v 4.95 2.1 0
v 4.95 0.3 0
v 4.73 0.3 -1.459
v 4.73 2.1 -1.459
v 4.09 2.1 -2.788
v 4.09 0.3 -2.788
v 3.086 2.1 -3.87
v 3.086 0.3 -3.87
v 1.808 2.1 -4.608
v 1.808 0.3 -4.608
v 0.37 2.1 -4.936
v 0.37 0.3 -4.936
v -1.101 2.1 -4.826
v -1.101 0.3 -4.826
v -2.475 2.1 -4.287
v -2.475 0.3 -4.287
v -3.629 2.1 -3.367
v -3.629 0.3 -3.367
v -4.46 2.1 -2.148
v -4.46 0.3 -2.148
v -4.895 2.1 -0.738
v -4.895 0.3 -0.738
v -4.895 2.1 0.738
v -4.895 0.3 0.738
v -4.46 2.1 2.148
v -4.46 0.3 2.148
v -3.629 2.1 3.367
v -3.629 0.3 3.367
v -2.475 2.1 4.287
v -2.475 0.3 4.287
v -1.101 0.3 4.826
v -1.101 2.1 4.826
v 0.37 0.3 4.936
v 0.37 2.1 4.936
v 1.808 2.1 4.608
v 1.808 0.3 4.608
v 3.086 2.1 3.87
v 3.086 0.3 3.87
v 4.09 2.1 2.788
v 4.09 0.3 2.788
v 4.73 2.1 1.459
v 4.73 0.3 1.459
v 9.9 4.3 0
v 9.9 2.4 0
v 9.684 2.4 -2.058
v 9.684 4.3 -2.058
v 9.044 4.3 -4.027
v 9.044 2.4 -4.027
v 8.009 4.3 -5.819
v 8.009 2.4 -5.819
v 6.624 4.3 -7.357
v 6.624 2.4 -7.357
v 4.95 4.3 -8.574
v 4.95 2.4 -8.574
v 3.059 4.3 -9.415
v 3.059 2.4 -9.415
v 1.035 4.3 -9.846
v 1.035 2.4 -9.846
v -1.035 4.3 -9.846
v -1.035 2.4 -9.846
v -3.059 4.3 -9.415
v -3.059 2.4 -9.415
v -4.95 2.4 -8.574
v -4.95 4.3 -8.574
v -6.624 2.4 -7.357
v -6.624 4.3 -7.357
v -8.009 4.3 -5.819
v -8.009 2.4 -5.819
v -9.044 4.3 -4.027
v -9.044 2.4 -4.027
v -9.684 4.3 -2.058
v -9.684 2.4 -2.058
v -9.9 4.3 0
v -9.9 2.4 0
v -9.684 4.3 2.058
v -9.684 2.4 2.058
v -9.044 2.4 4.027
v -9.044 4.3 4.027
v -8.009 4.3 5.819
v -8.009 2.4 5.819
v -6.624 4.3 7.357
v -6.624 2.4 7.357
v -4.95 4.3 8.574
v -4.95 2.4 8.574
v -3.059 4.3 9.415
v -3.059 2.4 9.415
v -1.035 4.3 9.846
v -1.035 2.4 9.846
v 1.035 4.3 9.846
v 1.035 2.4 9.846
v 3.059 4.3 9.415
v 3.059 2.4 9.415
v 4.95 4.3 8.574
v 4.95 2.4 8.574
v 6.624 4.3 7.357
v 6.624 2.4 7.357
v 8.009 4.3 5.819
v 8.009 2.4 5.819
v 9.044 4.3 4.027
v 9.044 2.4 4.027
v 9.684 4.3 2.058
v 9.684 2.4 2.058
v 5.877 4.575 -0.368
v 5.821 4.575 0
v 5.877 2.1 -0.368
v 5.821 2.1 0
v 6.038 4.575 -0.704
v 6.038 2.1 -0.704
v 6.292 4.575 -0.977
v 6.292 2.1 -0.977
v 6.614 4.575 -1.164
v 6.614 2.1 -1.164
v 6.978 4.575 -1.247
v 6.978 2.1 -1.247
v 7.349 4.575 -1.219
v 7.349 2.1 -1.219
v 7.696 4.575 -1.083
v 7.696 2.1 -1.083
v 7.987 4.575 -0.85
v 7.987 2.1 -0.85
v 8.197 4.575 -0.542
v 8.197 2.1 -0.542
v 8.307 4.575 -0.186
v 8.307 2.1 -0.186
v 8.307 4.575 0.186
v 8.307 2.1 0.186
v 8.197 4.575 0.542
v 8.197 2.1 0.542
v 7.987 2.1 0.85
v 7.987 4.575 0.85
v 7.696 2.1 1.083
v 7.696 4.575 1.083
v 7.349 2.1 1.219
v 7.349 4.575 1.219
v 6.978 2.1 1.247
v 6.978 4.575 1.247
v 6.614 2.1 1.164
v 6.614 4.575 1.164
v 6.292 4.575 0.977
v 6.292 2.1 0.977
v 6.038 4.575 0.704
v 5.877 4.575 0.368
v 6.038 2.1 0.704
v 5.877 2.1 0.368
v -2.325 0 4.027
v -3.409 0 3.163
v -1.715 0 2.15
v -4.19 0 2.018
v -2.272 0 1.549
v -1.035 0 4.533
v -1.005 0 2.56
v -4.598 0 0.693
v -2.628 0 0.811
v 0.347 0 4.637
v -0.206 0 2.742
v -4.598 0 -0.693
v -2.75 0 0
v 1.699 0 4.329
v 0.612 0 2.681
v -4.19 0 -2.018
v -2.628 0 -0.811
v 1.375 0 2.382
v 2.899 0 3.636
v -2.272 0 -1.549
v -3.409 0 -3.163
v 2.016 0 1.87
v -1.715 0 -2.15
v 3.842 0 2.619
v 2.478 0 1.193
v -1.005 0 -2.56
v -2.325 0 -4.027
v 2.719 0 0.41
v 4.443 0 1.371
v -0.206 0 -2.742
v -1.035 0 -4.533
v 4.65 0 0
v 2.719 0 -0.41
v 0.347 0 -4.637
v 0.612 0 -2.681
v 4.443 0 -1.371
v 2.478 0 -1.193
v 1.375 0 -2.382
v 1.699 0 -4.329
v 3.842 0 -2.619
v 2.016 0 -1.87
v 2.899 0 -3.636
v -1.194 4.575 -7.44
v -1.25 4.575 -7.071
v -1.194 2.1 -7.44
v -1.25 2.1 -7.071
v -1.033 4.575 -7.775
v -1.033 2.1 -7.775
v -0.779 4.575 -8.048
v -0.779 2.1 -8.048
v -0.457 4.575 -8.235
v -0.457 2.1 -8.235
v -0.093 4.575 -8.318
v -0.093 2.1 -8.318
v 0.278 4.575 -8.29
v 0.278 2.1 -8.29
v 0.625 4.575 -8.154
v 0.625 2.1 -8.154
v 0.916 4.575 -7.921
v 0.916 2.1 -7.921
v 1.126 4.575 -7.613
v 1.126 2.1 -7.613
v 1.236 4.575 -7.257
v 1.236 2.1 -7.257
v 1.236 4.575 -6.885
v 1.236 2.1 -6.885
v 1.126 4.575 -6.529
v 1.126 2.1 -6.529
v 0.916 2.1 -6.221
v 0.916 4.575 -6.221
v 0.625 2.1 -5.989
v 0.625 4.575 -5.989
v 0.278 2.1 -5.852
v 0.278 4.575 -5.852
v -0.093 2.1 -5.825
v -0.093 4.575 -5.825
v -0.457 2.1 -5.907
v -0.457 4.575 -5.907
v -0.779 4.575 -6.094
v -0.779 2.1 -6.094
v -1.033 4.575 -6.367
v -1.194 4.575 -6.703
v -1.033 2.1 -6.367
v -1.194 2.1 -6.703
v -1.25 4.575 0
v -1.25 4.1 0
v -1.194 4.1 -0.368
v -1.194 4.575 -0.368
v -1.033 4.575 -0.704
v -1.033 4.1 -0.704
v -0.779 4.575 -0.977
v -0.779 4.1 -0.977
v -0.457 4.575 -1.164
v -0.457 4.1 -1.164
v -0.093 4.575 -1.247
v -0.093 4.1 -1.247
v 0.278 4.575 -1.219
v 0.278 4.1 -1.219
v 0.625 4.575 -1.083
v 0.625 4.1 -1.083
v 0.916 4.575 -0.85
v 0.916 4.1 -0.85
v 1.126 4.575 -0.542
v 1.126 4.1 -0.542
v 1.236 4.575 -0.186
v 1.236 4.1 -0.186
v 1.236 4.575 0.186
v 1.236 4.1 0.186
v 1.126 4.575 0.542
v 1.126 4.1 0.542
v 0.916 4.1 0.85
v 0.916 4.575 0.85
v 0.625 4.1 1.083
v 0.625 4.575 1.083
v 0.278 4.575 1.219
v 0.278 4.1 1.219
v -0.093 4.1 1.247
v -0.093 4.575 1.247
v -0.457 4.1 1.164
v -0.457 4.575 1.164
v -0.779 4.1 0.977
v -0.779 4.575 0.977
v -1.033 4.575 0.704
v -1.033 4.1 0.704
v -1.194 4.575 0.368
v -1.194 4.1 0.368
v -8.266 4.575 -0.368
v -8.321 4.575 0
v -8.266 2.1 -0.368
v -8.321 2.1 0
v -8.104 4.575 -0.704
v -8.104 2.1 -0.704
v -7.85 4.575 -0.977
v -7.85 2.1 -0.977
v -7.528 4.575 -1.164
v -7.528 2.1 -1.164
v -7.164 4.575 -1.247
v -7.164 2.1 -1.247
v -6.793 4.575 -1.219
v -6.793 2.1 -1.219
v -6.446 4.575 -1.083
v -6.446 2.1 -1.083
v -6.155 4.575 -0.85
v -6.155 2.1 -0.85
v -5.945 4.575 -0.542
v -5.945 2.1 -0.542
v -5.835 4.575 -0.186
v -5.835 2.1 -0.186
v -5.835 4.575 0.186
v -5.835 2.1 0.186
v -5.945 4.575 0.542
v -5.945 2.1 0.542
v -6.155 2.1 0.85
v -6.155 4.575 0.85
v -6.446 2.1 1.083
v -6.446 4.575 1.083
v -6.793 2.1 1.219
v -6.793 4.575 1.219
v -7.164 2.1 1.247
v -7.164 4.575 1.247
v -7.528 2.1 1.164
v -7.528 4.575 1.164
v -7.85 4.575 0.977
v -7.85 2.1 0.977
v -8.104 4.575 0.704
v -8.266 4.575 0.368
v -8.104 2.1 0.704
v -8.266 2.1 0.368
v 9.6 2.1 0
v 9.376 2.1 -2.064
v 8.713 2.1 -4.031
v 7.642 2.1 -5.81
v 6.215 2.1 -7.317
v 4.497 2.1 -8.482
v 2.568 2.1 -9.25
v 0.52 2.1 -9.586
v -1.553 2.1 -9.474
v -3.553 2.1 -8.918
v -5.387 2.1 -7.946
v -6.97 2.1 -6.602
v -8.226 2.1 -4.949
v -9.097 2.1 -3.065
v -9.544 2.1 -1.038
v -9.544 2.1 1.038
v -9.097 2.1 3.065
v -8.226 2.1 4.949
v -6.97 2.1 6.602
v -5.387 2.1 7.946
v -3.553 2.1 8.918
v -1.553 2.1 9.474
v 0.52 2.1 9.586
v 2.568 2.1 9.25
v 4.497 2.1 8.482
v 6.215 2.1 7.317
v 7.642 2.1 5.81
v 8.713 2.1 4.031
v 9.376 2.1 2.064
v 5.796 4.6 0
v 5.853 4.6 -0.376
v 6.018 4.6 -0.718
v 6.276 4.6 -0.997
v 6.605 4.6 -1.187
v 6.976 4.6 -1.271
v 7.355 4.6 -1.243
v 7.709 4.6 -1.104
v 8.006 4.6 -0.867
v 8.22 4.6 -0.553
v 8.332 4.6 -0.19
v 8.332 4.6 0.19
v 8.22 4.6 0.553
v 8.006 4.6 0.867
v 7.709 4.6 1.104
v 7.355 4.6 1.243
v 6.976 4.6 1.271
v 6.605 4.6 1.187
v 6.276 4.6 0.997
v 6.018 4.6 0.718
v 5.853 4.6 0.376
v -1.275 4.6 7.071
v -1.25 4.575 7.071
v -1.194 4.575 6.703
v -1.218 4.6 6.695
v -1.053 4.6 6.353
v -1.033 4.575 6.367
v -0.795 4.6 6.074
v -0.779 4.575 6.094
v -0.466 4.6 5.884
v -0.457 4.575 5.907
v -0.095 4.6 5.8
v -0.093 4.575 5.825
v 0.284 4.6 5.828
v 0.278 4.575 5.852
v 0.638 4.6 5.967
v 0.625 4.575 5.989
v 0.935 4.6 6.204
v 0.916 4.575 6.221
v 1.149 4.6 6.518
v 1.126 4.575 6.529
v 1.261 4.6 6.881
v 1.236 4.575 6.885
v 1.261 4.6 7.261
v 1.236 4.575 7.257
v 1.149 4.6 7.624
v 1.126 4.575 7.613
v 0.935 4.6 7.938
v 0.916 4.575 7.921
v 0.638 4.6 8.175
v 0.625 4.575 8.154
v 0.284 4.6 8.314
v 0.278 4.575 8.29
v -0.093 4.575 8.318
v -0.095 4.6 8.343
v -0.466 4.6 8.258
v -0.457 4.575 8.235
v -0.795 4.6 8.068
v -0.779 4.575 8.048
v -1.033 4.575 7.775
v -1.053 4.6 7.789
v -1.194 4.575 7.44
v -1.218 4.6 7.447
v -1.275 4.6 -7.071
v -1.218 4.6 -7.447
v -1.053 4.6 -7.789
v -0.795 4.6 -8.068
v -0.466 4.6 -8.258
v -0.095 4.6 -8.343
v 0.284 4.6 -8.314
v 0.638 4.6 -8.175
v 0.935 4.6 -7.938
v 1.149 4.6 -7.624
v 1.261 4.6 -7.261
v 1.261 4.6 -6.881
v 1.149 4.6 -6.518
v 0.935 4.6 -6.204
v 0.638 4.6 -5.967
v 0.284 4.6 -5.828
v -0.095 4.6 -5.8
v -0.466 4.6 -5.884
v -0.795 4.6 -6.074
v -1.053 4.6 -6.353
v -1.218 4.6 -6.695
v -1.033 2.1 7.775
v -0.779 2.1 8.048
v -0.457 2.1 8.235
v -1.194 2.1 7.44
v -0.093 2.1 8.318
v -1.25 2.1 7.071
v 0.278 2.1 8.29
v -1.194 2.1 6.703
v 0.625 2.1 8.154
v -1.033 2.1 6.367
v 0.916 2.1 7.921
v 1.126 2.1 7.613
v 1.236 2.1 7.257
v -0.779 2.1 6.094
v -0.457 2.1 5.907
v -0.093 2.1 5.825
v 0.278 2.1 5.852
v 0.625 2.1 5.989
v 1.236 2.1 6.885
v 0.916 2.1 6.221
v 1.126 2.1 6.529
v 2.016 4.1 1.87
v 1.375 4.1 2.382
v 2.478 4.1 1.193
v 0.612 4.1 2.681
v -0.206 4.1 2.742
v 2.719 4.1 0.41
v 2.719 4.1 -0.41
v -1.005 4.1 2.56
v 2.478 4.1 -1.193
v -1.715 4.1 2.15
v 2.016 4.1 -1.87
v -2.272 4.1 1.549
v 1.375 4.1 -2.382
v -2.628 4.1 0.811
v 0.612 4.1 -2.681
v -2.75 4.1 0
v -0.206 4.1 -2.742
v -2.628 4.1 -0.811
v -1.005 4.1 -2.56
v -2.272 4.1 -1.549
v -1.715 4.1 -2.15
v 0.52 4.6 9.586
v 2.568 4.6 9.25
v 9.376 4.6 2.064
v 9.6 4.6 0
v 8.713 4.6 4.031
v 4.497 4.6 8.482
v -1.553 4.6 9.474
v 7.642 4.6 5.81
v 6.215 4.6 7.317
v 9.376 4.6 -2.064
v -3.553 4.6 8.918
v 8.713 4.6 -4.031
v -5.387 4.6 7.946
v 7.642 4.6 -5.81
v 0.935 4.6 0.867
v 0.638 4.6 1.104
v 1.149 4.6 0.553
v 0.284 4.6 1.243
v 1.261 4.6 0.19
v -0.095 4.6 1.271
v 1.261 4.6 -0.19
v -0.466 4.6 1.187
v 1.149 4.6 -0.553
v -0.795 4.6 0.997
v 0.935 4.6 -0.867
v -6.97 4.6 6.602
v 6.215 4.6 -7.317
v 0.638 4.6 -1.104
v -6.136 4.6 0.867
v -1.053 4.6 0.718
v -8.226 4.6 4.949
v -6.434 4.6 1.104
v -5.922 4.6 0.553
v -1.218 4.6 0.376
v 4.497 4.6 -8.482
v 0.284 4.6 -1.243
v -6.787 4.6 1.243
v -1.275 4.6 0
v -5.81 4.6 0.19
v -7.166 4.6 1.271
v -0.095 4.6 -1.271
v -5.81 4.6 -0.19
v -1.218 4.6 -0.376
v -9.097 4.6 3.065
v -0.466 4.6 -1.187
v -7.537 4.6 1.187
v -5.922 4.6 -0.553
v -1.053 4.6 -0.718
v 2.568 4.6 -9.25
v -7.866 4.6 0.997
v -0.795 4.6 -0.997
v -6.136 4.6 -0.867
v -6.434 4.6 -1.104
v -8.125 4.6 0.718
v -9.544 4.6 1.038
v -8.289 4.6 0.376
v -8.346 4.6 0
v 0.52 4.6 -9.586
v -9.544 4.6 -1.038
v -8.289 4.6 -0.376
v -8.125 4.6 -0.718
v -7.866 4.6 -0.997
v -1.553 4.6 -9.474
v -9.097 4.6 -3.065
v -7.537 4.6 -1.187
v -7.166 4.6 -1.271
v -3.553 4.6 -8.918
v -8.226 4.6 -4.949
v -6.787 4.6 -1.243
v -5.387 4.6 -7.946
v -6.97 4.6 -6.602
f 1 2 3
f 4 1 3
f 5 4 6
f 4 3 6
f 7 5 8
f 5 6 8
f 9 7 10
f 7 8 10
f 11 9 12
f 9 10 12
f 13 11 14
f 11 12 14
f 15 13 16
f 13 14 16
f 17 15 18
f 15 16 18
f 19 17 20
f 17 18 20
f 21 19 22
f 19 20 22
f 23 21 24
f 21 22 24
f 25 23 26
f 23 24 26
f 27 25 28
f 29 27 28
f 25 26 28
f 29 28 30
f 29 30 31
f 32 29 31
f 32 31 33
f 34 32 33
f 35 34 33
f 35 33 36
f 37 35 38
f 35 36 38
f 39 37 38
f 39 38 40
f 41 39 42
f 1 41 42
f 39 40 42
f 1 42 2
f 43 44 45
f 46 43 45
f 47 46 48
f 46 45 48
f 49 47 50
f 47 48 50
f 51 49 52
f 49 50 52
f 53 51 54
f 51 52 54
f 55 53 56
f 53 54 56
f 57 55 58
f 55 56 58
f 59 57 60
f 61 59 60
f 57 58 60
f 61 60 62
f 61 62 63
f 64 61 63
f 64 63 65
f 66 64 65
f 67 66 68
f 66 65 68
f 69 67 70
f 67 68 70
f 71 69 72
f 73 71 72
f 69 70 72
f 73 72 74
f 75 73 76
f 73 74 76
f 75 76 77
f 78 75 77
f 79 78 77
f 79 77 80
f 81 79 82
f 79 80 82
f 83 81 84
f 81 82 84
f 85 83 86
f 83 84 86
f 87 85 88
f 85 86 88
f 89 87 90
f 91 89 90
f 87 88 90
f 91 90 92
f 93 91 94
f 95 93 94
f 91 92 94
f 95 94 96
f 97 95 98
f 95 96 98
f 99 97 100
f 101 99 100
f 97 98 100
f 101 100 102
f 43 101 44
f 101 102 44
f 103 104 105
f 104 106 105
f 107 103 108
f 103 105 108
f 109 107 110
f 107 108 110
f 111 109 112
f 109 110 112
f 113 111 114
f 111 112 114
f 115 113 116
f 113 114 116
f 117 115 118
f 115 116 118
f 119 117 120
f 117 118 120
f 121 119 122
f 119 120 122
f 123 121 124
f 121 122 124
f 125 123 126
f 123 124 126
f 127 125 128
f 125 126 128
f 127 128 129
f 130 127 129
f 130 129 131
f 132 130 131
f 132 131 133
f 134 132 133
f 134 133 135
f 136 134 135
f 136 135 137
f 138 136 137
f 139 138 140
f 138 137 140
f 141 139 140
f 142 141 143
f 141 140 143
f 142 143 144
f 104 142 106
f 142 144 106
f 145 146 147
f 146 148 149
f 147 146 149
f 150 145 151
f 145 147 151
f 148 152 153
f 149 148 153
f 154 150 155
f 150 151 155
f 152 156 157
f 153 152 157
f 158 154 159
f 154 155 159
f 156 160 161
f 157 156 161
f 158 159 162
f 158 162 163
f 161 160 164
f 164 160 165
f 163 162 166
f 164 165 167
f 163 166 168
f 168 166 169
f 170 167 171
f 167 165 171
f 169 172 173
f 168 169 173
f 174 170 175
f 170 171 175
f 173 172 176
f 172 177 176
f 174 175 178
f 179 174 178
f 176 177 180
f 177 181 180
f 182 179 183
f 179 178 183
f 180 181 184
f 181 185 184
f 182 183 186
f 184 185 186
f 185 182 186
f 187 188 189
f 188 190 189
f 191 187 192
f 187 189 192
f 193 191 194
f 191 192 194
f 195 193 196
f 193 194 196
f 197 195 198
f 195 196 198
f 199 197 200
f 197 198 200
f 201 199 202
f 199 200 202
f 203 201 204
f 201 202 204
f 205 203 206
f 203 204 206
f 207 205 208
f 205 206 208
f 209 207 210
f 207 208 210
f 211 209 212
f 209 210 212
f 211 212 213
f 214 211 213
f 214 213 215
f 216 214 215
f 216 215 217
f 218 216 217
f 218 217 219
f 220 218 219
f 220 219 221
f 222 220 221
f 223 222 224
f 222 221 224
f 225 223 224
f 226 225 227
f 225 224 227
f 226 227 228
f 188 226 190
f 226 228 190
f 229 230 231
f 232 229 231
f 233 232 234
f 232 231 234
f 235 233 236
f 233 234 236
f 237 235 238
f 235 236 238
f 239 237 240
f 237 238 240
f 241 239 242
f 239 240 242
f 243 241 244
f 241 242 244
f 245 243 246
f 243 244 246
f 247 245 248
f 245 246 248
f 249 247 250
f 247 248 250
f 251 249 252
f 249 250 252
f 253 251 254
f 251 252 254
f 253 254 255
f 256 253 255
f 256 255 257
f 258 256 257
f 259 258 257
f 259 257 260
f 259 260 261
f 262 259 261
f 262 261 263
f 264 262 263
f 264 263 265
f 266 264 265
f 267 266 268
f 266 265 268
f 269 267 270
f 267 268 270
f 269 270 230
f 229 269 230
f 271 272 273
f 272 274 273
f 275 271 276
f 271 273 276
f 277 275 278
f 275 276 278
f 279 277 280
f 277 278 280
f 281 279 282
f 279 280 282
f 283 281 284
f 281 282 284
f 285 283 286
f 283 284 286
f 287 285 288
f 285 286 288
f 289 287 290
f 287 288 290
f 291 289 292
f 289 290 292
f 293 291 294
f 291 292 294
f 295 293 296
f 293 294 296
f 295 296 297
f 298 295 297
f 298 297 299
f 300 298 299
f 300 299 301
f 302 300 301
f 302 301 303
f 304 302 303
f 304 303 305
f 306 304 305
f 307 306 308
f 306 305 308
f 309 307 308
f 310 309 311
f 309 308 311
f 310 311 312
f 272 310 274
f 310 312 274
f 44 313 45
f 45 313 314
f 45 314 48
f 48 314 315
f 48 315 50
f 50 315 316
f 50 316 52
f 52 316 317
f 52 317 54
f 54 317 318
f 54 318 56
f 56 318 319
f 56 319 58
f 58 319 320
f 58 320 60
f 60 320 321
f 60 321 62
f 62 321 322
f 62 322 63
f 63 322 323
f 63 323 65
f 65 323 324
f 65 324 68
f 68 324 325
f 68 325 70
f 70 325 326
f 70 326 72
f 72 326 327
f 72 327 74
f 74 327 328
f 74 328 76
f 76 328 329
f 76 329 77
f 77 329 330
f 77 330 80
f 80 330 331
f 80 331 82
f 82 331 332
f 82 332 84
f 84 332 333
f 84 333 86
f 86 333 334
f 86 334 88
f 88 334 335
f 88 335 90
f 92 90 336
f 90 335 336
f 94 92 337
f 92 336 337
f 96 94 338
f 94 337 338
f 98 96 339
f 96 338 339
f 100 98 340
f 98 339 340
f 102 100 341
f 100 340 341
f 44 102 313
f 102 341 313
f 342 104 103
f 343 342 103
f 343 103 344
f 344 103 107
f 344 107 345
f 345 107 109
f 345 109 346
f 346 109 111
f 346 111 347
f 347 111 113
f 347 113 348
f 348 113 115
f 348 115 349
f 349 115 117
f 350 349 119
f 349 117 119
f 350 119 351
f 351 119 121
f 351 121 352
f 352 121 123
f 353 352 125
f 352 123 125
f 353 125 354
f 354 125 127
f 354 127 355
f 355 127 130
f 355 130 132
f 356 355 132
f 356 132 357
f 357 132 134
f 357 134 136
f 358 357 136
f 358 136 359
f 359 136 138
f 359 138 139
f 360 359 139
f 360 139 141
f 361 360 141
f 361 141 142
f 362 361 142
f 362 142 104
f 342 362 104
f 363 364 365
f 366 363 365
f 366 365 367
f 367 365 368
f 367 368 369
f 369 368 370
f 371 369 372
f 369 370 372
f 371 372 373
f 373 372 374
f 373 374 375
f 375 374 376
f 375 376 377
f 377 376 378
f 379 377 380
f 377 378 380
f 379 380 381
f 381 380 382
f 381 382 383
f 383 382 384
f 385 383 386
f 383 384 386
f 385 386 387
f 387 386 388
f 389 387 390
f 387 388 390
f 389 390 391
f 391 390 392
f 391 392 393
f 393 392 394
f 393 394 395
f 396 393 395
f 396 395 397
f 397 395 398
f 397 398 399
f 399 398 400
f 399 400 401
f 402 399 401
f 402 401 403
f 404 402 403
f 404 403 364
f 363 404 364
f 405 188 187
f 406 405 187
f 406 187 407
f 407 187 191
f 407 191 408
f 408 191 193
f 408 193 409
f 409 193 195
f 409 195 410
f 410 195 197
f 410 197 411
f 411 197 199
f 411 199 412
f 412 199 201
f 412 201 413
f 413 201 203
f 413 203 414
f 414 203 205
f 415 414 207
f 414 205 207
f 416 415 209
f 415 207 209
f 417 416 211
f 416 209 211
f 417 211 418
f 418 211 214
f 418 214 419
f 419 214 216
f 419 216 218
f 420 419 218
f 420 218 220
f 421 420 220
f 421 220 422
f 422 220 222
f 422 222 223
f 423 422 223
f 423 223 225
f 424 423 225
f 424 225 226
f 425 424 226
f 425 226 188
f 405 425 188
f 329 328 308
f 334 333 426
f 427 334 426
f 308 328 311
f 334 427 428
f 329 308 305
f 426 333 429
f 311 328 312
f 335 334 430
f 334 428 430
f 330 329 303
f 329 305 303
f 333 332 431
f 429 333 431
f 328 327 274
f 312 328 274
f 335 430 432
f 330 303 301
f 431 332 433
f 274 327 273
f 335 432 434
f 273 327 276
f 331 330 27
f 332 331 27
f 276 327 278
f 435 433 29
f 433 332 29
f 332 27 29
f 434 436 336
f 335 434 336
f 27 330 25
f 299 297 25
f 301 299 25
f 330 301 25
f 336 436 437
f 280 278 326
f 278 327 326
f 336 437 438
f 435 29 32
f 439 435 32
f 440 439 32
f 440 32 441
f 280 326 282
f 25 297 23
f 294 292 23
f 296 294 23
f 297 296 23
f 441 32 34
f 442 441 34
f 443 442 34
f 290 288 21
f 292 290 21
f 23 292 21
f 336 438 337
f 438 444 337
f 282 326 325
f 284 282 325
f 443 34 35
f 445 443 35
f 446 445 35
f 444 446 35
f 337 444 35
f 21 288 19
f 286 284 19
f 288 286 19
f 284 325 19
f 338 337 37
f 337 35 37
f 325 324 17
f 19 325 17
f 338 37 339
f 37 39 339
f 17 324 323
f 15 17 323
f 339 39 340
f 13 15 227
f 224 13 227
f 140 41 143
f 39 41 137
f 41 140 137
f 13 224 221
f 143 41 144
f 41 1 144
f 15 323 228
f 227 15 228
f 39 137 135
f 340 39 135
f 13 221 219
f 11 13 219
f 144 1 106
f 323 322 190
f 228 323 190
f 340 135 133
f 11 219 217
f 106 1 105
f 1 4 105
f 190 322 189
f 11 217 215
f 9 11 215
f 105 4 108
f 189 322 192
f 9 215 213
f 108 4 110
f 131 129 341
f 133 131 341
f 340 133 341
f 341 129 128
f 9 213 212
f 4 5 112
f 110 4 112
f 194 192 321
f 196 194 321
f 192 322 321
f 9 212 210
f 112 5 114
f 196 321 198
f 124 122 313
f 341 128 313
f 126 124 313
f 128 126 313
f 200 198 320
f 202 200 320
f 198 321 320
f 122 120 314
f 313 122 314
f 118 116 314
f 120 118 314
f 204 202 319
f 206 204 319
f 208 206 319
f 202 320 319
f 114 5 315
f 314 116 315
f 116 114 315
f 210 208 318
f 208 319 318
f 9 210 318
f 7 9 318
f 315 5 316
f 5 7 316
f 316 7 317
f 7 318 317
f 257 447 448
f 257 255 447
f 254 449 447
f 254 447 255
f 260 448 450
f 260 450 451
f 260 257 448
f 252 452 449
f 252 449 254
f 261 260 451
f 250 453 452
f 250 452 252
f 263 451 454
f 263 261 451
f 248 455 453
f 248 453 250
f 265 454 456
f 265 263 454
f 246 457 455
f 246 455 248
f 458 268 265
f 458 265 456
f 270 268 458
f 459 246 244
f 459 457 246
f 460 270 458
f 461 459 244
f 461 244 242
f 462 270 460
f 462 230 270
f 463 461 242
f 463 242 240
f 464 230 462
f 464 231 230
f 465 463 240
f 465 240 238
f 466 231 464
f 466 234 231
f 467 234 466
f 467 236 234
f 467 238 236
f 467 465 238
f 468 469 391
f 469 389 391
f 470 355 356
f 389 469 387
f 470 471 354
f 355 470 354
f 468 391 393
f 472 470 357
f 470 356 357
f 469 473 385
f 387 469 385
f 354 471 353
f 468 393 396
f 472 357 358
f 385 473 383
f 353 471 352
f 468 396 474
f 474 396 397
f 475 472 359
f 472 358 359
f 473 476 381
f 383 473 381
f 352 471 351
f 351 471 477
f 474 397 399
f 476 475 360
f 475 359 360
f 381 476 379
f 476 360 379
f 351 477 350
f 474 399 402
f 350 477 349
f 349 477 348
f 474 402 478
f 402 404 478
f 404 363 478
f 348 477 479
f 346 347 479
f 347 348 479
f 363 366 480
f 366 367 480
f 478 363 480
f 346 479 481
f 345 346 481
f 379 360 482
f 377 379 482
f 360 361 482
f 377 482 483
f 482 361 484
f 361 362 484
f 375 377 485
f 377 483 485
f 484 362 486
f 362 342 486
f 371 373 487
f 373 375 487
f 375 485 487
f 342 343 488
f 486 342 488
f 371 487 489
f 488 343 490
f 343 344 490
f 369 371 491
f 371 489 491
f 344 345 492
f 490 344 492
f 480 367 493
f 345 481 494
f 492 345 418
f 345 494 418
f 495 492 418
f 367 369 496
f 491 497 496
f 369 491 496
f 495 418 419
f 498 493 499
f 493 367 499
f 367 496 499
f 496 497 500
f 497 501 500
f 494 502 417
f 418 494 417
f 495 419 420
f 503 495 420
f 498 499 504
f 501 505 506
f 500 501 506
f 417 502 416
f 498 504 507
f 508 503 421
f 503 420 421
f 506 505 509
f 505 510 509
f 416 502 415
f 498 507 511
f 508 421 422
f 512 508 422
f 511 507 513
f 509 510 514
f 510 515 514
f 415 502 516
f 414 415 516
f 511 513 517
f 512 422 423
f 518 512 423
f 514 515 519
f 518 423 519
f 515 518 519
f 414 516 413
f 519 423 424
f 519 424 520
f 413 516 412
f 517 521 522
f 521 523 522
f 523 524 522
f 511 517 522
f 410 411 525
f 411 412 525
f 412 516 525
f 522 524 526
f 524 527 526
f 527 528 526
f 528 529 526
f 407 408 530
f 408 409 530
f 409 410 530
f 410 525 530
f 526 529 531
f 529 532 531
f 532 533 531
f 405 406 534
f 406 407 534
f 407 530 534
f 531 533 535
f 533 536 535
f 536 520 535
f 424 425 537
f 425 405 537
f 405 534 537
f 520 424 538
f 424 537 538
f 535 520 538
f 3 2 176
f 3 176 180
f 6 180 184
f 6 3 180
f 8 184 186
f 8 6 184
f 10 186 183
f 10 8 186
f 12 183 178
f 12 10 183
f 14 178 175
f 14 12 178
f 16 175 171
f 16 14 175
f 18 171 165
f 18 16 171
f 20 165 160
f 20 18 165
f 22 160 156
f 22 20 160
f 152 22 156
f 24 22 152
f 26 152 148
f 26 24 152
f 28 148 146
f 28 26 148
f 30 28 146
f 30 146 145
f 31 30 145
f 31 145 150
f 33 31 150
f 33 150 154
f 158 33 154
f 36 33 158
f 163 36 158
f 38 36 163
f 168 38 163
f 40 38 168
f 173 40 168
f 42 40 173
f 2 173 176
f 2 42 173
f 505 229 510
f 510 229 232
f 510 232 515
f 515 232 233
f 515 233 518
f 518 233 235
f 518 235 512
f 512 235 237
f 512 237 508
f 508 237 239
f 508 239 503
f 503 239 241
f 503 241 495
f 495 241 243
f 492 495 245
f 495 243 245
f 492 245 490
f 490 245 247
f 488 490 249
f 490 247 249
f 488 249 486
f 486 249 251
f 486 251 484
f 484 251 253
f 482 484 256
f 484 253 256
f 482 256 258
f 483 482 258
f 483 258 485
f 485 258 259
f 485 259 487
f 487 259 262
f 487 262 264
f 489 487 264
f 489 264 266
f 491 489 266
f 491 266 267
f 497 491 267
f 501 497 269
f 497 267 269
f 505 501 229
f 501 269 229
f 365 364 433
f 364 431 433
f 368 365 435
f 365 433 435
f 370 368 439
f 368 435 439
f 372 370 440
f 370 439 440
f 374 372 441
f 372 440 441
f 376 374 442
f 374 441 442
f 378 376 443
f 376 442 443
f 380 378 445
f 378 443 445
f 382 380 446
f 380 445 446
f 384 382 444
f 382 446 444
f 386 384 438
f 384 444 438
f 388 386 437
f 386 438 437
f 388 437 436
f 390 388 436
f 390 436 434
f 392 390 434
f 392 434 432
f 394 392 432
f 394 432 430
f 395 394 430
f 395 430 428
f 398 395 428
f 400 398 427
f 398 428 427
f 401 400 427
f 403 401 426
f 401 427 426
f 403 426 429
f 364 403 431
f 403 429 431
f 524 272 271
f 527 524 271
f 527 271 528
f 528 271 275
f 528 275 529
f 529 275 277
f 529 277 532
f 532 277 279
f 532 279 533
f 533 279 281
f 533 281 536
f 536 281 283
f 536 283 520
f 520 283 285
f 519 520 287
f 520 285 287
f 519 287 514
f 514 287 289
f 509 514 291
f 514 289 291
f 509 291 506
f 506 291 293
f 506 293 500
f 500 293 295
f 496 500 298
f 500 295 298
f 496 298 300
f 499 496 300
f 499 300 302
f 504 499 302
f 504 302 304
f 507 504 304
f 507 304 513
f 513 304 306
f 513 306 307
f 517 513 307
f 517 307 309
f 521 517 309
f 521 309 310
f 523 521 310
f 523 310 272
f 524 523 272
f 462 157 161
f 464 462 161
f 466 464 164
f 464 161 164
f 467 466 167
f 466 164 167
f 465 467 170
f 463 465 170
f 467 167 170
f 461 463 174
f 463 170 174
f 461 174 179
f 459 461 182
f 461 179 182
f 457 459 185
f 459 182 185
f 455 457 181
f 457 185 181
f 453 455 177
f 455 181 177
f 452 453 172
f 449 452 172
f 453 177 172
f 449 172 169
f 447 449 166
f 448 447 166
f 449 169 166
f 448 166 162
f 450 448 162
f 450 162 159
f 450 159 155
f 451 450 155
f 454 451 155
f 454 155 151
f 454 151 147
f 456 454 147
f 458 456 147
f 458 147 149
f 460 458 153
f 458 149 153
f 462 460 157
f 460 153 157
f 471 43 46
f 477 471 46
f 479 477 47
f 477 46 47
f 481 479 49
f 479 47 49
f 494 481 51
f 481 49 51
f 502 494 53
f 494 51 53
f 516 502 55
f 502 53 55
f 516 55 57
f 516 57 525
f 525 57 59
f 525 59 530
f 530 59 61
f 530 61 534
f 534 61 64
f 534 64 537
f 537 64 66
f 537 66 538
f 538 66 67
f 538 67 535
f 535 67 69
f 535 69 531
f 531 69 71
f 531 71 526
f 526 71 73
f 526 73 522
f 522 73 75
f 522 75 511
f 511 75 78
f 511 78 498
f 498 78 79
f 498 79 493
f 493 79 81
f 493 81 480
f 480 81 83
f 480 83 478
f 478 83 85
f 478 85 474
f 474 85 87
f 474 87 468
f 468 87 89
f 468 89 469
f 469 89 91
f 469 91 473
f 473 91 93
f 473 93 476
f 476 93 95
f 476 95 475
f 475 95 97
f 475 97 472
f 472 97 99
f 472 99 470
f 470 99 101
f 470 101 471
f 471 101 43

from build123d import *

# Parameters (mm, degrees)
CHAMFER_1_SIZE               = 0.3
HOLE_WIZARD_M3_1_D           = 2.5
HOLE_WIZARD_M3_1_CSINK_D     = 2.55
HOLE_WIZARD_M3_1_CSINK_ANGLE = 90
SKETCH_5_R                   = 2.75
CUT_EXTRUDE_1_DEPTH          = 1
CUT_EXTRUDE_1_DEPTH_BACK     = 4.1


with BuildPart() as part:
    # 草图2 → 旋转1 (revolve)
    with BuildSketch(Plane.XY):
        Polygon((4.95, 0), (0, 0), (0, 4.6), (9.9, 4.6), (9.9, 2.1), (4.95, 2.1), align=None)
    revolve(axis=Axis((0, 0, 0), (0, 1, 0)))

    # 倒角1
    chamfer_1_edges = [part.edges().sort_by_distance(p)[0] for p in [
        (-9.9, 4.6, 0),
        (-9.9, 2.1, 0),
        (-4.95, 0, 0),
    ]]
    chamfer(chamfer_1_edges, length=CHAMFER_1_SIZE)

    # M3 螺纹孔的螺纹孔钻头1 (through all)
    with Locations(Plane(origin=(0, 4.6, 0), x_dir=(1, 0, 0), z_dir=(0, 1, 0))):
        with Locations((7.071067812, 0), (0, -7.071067812), (-7.071067812, 0), (0, 7.071067812), (0, 0)):
            CounterSinkHole(HOLE_WIZARD_M3_1_D / 2, HOLE_WIZARD_M3_1_CSINK_D / 2, counter_sink_angle=HOLE_WIZARD_M3_1_CSINK_ANGLE)

    # 草图5 → 切除-拉伸1 (cut, two sides)
    with BuildSketch(Plane(origin=(0, 0, 0), x_dir=(-1, 0, 0), z_dir=(0, -1, 0))) as cut_extrude_1_sk:
        Circle(SKETCH_5_R)
    extrude(amount=CUT_EXTRUDE_1_DEPTH, mode=Mode.SUBTRACT)
    extrude(cut_extrude_1_sk.sketch, amount=-CUT_EXTRUDE_1_DEPTH_BACK, mode=Mode.SUBTRACT)


solid = part.part
